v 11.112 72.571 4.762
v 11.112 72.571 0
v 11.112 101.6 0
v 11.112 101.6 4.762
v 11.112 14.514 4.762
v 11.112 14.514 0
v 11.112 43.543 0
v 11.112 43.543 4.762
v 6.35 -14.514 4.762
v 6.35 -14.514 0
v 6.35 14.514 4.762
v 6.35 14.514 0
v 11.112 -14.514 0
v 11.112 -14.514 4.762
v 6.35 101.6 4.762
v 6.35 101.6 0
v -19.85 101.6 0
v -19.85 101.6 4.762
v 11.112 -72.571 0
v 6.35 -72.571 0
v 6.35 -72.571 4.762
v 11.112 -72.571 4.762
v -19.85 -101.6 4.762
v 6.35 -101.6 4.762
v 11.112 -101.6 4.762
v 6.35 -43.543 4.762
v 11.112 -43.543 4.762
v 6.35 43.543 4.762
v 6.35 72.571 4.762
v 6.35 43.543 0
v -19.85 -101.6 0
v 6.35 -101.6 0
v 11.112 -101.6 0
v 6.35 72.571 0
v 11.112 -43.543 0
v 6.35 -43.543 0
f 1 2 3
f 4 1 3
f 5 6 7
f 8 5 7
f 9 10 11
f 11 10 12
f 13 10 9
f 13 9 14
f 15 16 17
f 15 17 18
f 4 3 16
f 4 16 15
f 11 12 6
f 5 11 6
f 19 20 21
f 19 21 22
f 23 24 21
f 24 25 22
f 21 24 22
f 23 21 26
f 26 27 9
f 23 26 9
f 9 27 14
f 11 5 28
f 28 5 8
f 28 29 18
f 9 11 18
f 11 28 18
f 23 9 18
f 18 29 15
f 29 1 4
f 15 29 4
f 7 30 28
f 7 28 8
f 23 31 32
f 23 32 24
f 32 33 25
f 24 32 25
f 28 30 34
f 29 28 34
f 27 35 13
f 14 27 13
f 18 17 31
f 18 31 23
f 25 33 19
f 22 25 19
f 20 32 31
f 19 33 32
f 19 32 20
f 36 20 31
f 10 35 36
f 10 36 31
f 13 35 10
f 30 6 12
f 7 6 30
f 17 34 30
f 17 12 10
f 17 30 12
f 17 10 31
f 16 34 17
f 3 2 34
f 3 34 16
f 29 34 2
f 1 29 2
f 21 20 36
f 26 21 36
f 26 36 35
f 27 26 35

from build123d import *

# Parameters (mm, degrees)
SKETCH1_W           = 6.35
SKETCH1_H           = 203.2
SKETCH1_W_2         = 4.7625
SKETCH1_H_2         = 29.028571429
BOSS_EXTRUDE1_DEPTH = 4.7625
SKETCH2_W           = 4.7625
SKETCH2_H           = 203.2
BOSS_EXTRUDE2_DEPTH = 13.5


with BuildPart() as part:
    # Sketch1 → Boss-Extrude1 (new body)
    with BuildSketch(Plane.XY):
        with Locations((-3.175, 0)):
            Rectangle(SKETCH1_W, SKETCH1_H)
        Polygon((6.35, 101.6), (0, 101.6), (0, -101.6), (6.35, -101.6), (6.35, -72.571428571), (6.35, -43.542857143), (6.35, -14.514285714), (6.35, 14.514285714), (6.35, 43.542857143), (6.35, 72.571428571), align=None)
        with Locations((8.73125, 87.085714286)):
            Rectangle(SKETCH1_W_2, SKETCH1_H_2)
        with Locations((8.73125, 29.028571429)):
            Rectangle(SKETCH1_W_2, SKETCH1_H_2)
        with Locations((8.73125, -29.028571429)):
            Rectangle(SKETCH1_W_2, SKETCH1_H_2)
        with Locations((8.73125, -87.085714286)):
            Rectangle(SKETCH1_W_2, SKETCH1_H_2)
    extrude(amount=BOSS_EXTRUDE1_DEPTH)

    # Sketch2 → Boss-Extrude2 (add)
    with BuildSketch(Plane.ZY.offset(6.35)):
        with Locations((2.38125, 0)):
            Rectangle(SKETCH2_W, SKETCH2_H)
    extrude(amount=BOSS_EXTRUDE2_DEPTH)


solid = part.part
